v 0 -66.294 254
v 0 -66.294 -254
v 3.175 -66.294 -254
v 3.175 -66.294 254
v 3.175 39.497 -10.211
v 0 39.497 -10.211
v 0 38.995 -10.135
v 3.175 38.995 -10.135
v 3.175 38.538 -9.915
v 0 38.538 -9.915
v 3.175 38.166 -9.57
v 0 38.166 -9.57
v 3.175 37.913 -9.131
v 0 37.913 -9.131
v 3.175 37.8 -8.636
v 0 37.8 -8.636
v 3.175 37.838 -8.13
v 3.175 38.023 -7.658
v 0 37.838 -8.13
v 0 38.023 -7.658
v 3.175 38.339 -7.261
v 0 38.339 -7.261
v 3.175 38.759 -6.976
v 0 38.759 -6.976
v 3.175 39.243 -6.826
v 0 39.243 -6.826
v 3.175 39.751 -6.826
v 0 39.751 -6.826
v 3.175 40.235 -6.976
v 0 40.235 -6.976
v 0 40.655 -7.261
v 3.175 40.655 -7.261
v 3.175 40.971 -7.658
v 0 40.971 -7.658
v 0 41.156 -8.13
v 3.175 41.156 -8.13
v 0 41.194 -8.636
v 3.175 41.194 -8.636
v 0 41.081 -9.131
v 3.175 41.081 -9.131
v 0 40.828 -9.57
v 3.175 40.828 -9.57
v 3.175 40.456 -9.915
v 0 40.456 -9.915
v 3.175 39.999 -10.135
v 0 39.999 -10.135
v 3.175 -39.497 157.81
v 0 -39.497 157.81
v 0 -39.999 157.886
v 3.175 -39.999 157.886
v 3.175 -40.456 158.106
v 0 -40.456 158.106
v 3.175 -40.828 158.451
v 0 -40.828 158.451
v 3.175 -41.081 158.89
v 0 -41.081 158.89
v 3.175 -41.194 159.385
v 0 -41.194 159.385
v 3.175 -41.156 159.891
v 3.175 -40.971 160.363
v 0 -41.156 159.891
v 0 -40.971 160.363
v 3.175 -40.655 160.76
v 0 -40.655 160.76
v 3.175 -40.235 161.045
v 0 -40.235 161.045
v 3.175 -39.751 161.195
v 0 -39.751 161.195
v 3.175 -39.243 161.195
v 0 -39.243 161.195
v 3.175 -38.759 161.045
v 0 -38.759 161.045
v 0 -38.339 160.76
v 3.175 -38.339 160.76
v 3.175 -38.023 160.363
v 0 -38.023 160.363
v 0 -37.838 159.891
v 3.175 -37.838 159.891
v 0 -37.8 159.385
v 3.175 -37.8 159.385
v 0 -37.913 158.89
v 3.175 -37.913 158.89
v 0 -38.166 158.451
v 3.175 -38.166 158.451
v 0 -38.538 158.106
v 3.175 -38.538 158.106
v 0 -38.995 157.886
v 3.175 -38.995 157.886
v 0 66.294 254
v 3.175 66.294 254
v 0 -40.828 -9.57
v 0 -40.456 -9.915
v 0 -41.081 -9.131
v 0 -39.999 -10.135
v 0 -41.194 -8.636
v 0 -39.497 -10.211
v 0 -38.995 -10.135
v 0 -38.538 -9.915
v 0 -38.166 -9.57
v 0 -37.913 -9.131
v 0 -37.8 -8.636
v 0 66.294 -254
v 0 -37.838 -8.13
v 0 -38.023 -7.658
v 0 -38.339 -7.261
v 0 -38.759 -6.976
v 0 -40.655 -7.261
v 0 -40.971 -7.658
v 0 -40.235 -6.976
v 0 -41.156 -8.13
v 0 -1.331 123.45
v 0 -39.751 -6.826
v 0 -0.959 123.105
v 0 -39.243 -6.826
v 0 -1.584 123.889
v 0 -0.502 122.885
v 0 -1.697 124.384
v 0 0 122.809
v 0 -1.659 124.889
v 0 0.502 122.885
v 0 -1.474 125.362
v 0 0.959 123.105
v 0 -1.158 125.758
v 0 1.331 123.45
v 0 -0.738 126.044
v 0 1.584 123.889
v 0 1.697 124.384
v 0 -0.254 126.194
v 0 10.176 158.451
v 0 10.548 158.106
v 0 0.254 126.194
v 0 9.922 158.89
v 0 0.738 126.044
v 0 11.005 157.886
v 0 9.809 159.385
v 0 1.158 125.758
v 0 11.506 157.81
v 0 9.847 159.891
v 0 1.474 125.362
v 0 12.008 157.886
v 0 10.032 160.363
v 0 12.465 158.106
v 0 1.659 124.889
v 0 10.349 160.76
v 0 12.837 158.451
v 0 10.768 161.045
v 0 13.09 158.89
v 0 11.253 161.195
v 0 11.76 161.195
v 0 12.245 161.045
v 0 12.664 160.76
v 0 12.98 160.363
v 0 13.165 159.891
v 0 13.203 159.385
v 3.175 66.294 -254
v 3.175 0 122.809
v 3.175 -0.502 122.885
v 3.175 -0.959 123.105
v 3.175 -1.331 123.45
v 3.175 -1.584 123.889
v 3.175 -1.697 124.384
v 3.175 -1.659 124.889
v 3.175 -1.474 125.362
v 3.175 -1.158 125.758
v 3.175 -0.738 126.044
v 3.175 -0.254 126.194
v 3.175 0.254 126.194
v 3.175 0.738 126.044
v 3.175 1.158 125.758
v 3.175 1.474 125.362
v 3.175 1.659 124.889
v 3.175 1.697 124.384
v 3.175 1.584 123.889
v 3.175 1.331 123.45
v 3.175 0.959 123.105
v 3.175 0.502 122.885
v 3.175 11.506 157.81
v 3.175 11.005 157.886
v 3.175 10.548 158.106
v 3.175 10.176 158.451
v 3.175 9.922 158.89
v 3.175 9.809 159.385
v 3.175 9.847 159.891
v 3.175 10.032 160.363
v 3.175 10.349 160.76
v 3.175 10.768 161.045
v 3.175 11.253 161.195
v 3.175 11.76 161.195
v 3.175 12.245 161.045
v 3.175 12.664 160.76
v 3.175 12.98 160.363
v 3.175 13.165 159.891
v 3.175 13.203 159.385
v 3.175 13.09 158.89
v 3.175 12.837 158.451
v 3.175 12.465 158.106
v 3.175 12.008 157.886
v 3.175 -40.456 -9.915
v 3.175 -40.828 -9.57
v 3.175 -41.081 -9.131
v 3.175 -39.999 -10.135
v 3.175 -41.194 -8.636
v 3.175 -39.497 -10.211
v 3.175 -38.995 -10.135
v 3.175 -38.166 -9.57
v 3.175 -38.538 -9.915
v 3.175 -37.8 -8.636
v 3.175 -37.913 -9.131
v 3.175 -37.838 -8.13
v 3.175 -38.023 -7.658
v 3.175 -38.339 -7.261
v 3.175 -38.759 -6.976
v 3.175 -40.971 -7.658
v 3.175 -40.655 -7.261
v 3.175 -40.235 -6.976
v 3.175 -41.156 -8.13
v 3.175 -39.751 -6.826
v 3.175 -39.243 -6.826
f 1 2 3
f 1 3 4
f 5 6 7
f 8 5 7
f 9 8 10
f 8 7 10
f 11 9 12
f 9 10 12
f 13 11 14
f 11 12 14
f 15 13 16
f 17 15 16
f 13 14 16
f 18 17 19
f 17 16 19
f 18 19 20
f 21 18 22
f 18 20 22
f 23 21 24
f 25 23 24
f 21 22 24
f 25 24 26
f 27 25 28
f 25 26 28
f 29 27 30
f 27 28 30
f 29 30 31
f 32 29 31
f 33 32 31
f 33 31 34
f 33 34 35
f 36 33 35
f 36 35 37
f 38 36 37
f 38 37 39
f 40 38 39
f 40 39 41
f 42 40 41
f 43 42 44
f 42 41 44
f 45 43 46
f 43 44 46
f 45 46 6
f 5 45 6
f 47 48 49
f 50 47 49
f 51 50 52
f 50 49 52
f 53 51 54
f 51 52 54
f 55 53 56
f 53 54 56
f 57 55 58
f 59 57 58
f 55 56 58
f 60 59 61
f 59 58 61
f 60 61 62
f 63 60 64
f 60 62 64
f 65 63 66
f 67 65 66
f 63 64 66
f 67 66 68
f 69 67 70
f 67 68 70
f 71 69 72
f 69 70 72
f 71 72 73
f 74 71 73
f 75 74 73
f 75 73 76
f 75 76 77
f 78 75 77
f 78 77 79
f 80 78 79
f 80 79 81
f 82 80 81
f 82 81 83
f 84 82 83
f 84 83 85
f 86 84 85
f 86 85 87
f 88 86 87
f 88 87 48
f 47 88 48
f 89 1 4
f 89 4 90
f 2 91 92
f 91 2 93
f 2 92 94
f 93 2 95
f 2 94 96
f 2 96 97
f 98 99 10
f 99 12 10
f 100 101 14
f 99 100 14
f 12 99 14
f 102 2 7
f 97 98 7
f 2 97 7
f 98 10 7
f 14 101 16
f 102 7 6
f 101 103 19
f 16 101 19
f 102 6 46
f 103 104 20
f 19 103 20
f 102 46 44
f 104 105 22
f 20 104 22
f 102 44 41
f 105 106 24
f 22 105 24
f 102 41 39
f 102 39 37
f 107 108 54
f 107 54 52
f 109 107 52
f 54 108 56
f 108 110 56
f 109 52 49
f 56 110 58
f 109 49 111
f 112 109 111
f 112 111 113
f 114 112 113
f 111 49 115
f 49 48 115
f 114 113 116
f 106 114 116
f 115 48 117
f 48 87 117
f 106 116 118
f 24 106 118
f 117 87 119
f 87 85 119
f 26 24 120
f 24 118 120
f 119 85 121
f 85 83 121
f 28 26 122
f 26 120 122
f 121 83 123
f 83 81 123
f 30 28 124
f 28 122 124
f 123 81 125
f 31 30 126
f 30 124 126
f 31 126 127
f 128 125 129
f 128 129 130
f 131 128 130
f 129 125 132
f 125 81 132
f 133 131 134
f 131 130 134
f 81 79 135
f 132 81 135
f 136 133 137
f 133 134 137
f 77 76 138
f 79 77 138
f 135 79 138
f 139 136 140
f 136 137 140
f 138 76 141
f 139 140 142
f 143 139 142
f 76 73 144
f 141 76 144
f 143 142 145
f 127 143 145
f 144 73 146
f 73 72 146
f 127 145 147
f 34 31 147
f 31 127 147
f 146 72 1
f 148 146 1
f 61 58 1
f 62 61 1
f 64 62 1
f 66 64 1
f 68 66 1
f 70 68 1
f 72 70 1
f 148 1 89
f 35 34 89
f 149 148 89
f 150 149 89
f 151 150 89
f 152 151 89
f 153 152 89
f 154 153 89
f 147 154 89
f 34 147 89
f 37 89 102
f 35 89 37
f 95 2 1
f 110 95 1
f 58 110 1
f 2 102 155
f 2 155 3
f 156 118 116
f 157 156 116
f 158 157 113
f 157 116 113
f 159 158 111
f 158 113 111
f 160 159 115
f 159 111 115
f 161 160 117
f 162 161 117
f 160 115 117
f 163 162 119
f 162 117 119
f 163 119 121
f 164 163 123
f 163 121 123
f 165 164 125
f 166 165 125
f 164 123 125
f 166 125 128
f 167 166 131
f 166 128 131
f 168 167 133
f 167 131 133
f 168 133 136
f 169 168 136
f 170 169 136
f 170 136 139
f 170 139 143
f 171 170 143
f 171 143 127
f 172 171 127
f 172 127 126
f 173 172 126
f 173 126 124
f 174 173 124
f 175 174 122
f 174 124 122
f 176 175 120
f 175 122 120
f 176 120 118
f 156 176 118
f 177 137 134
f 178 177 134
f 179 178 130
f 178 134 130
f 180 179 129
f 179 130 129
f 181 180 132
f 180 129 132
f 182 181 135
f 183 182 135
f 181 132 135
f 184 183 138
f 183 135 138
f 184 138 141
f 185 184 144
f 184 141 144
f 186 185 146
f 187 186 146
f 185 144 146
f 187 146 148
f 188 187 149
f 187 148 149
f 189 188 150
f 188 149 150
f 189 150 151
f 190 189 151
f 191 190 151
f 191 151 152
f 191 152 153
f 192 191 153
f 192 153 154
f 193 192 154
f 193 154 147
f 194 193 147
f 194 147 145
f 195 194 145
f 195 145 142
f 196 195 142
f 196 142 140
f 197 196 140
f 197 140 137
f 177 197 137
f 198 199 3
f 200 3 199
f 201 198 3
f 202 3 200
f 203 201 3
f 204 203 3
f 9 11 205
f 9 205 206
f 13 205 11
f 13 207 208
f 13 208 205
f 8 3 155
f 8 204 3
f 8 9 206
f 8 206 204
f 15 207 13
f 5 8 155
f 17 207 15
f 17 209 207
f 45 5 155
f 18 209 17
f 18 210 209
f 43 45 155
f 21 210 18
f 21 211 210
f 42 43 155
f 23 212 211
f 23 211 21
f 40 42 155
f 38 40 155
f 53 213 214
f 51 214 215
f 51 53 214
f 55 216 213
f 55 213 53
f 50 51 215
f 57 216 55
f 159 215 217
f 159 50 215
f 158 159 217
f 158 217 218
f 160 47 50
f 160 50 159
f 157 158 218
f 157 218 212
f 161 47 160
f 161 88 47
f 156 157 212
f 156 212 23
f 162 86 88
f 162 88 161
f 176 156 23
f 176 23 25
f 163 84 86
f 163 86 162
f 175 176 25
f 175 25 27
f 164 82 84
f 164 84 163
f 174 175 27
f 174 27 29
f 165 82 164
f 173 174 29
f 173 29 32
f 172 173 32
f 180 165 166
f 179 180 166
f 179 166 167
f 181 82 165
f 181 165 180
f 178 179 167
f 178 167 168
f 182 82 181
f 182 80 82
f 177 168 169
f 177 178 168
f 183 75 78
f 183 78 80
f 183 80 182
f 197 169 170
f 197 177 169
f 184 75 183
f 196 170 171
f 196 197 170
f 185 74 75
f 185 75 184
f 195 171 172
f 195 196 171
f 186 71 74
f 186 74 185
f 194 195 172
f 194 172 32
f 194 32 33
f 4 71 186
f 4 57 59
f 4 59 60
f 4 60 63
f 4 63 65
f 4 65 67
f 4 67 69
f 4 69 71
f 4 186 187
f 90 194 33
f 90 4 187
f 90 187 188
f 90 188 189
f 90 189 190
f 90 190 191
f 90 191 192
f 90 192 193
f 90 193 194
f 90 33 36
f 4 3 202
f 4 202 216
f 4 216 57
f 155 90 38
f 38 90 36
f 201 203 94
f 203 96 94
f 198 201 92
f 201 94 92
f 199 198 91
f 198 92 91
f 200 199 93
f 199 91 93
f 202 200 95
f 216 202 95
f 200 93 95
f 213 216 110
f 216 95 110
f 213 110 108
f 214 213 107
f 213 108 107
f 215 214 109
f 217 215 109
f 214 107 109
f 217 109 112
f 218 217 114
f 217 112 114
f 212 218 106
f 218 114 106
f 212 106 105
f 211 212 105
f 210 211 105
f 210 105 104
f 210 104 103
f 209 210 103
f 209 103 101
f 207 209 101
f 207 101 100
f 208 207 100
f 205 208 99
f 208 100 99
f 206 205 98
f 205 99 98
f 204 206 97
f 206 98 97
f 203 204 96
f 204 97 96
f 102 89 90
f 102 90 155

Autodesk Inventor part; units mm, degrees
ref_plane "YZ Plane" through (0, 0, 0) normal (1, 0, 0) x (0, 1, 0)
ref_plane "XZ Plane" through (0, 0, 0) normal (0, 1, 0) x (-1, 0, 0)
ref_plane "XY Plane" through (0, 0, 0) normal (0, 0, 1) x (1, 0, 0)
sketch "Sketch1" plane through (0, 0, 0) normal (1, 0, 0) x (0, 1, 0)
  line L0 (-66.294, 254) -> (66.294, 254)
  line L1 (66.294, 254) -> (66.294, -254)
  line L2 (66.294, -254) -> (-66.294, -254)
  line L3 (-66.294, -254) -> (-66.294, 254)
  line L4 (-66.294, 254) -> (66.294, -254) construction
  line L5 (66.294, 254) -> (-66.294, -254) construction
  point P0 (0, 0)
  dimension "d0" = 508
  dimension "d1" = 132.588
extrude "pdu nmt right side panel" add sketch "Sketch1" along normal blind 3.175
sketch "snap psu" plane through (0, 0, 0) normal (-1, 0, 0) x (0, 0, 1)
  line L0 (-21.209, -49.5046) -> (-21.209, 49.5046) construction
  line L1 (-21.209, 49.5046) -> (190.5, 49.5046) construction
  line L2 (190.5, 49.5046) -> (190.5, -49.5046) construction
  line L3 (190.5, -49.5046) -> (-21.209, -49.5046) construction
  line L4 (179.5018, -49.5046) -> (179.5018, 49.5046) construction
  line L5 (-254, 66.294) -> (254, 66.294) projected
  line L6 (254, -66.294) -> (254, 66.294) projected
  line L7 (159.512, 11.5062) -> (159.512, -19.2811) construction
  line L8 (-8.509, 39.497) -> (-8.509, -39.497) construction
  line L9 (124.5108, 0) -> (186.1095, 0) construction
  point P0 (0, 0)
  point P1 (159.512, -39.497)
  dimension "d19" = 10.0076
  dimension "d20" = 30.988
  dimension "d21" = 99.0092
  dimension "d22" = 12.7
  dimension "d23" = 10.9982
  dimension "d24" = 16.7894
  dimension "d25" = 63.5
  dimension "d33" = 10.0076
  dimension "d34" = 89.0016
  dimension "d35" = 30.988
  dimension "d36" = 61.0108
  dimension "d37" = 65.9892
  dimension "d38" = 49.5046
  dimension "d39" = 199.009
  dimension "d40" = 199.009
sketch "Sketch5" plane through (3.175, 0, 0) normal (1, 0, 0) x (0, 0, -1)
  point P0 (0, 0)
  point P1 (8.509, 39.497)
  point P2 (8.509, -39.497)
  point P3 (-124.5108, 0)
  point P4 (-159.512, 11.5062)
  point P5 (-159.512, -39.497)
hole "snap psu holes" at (3.175, 11.5062, 159.512) at (3.175, -39.497, 159.512) at (3.175, 0, 124.5108) at (3.175, 39.497, -8.509) at (3.175, -39.497, -8.509) direction (-1, 0, 0) diameter 3.4036 end through all clearance for "Countersunk Flat Head Screw ISO 2009/7046" size "M3" standard "ISO"
properties part number "nmt_sidepanel_20in"
